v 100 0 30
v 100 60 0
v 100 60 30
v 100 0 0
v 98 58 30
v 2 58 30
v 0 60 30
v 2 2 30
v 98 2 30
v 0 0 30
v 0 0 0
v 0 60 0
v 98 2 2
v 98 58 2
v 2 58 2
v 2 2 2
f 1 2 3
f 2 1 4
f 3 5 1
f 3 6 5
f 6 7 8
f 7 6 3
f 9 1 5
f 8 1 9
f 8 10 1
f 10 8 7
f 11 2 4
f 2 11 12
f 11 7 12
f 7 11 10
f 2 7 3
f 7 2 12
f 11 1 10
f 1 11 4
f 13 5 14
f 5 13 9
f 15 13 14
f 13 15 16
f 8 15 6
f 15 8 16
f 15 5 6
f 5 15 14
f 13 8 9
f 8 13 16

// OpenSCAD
// ============================================================================
// Electronic Project Enclosure
// Purpose: Hollow box w/ vents and cable entry.
// Units: millimetres (mm)
// ============================================================================

/* ----------------------------- USER PARAMETERS -------------------------------- */
box_length = 100;         // enclosure length (mm)
box_width = 60;           // enclosure width (mm)
box_height = 30;          // enclosure height (mm)
wall_thickness = 2;       // wall thickness (mm)
vent_count = 6;           // number of ventilation holes
cable_diameter = 8;       // cable entry diameter (mm)
clearance = 0.3;          // fit tolerance

/* ------------------------- Assertions & Limits ---------------------------- */
assert(box_length > 0 && box_width > 0 && box_height > 0, "box dims > 0");
assert(wall_thickness >= 0, "wall_thickness ≥ 0");

/* ------------------------- Derived Measurements --------------------------- */
inner_length = box_length - 2*wall_thickness;
inner_width  = box_width  - 2*wall_thickness;
inner_height = box_height - wall_thickness;

/* ------------------------------ Modules ---------------------------------- */
module enclosure_box() {
  difference() {
    // Outer shell
    cube([box_length, box_width, box_height], center=false);

    // Hollow
    if (wall_thickness > 0) {
      translate([wall_thickness, wall_thickness, wall_thickness])
        cube([inner_length, inner_width, inner_height], center=false);
    }

    // Cable entry on one side
    if (cable_diameter > 0) {
      translate([box_length/2, -0.5, box_height/2])
        rotate([90,0,0])
        cylinder(d=cable_diameter + clearance, h=wall_thickness + 1, $fn=64);
    }

    // Top vents array
    if (vent_count > 0) {
      for (i = [0:vent_count-1]) {
        translate([ (i+0.5)*(box_length/vent_count), box_width/2, box_height + 0.5 ])
          rotate([90,0,0])
          cylinder(d=4 + clearance, h=wall_thickness + 1, $fn=48);
      }
    }
  }
}

/* --------------------------------- Call ---------------------------------- */
enclosure_box();

/* ============================== HOW TO PRINT / ORIENT ============================== */
// Print orientation: Bottom face down on build plate
// Supports: None needed
// Layer height: 0.2-0.3mm
// Infill: 15-20% sufficient for electronics housing
// Print speed: Normal (50mm/s)
// Post-processing: Test fit cables through entry hole, drill if needed
